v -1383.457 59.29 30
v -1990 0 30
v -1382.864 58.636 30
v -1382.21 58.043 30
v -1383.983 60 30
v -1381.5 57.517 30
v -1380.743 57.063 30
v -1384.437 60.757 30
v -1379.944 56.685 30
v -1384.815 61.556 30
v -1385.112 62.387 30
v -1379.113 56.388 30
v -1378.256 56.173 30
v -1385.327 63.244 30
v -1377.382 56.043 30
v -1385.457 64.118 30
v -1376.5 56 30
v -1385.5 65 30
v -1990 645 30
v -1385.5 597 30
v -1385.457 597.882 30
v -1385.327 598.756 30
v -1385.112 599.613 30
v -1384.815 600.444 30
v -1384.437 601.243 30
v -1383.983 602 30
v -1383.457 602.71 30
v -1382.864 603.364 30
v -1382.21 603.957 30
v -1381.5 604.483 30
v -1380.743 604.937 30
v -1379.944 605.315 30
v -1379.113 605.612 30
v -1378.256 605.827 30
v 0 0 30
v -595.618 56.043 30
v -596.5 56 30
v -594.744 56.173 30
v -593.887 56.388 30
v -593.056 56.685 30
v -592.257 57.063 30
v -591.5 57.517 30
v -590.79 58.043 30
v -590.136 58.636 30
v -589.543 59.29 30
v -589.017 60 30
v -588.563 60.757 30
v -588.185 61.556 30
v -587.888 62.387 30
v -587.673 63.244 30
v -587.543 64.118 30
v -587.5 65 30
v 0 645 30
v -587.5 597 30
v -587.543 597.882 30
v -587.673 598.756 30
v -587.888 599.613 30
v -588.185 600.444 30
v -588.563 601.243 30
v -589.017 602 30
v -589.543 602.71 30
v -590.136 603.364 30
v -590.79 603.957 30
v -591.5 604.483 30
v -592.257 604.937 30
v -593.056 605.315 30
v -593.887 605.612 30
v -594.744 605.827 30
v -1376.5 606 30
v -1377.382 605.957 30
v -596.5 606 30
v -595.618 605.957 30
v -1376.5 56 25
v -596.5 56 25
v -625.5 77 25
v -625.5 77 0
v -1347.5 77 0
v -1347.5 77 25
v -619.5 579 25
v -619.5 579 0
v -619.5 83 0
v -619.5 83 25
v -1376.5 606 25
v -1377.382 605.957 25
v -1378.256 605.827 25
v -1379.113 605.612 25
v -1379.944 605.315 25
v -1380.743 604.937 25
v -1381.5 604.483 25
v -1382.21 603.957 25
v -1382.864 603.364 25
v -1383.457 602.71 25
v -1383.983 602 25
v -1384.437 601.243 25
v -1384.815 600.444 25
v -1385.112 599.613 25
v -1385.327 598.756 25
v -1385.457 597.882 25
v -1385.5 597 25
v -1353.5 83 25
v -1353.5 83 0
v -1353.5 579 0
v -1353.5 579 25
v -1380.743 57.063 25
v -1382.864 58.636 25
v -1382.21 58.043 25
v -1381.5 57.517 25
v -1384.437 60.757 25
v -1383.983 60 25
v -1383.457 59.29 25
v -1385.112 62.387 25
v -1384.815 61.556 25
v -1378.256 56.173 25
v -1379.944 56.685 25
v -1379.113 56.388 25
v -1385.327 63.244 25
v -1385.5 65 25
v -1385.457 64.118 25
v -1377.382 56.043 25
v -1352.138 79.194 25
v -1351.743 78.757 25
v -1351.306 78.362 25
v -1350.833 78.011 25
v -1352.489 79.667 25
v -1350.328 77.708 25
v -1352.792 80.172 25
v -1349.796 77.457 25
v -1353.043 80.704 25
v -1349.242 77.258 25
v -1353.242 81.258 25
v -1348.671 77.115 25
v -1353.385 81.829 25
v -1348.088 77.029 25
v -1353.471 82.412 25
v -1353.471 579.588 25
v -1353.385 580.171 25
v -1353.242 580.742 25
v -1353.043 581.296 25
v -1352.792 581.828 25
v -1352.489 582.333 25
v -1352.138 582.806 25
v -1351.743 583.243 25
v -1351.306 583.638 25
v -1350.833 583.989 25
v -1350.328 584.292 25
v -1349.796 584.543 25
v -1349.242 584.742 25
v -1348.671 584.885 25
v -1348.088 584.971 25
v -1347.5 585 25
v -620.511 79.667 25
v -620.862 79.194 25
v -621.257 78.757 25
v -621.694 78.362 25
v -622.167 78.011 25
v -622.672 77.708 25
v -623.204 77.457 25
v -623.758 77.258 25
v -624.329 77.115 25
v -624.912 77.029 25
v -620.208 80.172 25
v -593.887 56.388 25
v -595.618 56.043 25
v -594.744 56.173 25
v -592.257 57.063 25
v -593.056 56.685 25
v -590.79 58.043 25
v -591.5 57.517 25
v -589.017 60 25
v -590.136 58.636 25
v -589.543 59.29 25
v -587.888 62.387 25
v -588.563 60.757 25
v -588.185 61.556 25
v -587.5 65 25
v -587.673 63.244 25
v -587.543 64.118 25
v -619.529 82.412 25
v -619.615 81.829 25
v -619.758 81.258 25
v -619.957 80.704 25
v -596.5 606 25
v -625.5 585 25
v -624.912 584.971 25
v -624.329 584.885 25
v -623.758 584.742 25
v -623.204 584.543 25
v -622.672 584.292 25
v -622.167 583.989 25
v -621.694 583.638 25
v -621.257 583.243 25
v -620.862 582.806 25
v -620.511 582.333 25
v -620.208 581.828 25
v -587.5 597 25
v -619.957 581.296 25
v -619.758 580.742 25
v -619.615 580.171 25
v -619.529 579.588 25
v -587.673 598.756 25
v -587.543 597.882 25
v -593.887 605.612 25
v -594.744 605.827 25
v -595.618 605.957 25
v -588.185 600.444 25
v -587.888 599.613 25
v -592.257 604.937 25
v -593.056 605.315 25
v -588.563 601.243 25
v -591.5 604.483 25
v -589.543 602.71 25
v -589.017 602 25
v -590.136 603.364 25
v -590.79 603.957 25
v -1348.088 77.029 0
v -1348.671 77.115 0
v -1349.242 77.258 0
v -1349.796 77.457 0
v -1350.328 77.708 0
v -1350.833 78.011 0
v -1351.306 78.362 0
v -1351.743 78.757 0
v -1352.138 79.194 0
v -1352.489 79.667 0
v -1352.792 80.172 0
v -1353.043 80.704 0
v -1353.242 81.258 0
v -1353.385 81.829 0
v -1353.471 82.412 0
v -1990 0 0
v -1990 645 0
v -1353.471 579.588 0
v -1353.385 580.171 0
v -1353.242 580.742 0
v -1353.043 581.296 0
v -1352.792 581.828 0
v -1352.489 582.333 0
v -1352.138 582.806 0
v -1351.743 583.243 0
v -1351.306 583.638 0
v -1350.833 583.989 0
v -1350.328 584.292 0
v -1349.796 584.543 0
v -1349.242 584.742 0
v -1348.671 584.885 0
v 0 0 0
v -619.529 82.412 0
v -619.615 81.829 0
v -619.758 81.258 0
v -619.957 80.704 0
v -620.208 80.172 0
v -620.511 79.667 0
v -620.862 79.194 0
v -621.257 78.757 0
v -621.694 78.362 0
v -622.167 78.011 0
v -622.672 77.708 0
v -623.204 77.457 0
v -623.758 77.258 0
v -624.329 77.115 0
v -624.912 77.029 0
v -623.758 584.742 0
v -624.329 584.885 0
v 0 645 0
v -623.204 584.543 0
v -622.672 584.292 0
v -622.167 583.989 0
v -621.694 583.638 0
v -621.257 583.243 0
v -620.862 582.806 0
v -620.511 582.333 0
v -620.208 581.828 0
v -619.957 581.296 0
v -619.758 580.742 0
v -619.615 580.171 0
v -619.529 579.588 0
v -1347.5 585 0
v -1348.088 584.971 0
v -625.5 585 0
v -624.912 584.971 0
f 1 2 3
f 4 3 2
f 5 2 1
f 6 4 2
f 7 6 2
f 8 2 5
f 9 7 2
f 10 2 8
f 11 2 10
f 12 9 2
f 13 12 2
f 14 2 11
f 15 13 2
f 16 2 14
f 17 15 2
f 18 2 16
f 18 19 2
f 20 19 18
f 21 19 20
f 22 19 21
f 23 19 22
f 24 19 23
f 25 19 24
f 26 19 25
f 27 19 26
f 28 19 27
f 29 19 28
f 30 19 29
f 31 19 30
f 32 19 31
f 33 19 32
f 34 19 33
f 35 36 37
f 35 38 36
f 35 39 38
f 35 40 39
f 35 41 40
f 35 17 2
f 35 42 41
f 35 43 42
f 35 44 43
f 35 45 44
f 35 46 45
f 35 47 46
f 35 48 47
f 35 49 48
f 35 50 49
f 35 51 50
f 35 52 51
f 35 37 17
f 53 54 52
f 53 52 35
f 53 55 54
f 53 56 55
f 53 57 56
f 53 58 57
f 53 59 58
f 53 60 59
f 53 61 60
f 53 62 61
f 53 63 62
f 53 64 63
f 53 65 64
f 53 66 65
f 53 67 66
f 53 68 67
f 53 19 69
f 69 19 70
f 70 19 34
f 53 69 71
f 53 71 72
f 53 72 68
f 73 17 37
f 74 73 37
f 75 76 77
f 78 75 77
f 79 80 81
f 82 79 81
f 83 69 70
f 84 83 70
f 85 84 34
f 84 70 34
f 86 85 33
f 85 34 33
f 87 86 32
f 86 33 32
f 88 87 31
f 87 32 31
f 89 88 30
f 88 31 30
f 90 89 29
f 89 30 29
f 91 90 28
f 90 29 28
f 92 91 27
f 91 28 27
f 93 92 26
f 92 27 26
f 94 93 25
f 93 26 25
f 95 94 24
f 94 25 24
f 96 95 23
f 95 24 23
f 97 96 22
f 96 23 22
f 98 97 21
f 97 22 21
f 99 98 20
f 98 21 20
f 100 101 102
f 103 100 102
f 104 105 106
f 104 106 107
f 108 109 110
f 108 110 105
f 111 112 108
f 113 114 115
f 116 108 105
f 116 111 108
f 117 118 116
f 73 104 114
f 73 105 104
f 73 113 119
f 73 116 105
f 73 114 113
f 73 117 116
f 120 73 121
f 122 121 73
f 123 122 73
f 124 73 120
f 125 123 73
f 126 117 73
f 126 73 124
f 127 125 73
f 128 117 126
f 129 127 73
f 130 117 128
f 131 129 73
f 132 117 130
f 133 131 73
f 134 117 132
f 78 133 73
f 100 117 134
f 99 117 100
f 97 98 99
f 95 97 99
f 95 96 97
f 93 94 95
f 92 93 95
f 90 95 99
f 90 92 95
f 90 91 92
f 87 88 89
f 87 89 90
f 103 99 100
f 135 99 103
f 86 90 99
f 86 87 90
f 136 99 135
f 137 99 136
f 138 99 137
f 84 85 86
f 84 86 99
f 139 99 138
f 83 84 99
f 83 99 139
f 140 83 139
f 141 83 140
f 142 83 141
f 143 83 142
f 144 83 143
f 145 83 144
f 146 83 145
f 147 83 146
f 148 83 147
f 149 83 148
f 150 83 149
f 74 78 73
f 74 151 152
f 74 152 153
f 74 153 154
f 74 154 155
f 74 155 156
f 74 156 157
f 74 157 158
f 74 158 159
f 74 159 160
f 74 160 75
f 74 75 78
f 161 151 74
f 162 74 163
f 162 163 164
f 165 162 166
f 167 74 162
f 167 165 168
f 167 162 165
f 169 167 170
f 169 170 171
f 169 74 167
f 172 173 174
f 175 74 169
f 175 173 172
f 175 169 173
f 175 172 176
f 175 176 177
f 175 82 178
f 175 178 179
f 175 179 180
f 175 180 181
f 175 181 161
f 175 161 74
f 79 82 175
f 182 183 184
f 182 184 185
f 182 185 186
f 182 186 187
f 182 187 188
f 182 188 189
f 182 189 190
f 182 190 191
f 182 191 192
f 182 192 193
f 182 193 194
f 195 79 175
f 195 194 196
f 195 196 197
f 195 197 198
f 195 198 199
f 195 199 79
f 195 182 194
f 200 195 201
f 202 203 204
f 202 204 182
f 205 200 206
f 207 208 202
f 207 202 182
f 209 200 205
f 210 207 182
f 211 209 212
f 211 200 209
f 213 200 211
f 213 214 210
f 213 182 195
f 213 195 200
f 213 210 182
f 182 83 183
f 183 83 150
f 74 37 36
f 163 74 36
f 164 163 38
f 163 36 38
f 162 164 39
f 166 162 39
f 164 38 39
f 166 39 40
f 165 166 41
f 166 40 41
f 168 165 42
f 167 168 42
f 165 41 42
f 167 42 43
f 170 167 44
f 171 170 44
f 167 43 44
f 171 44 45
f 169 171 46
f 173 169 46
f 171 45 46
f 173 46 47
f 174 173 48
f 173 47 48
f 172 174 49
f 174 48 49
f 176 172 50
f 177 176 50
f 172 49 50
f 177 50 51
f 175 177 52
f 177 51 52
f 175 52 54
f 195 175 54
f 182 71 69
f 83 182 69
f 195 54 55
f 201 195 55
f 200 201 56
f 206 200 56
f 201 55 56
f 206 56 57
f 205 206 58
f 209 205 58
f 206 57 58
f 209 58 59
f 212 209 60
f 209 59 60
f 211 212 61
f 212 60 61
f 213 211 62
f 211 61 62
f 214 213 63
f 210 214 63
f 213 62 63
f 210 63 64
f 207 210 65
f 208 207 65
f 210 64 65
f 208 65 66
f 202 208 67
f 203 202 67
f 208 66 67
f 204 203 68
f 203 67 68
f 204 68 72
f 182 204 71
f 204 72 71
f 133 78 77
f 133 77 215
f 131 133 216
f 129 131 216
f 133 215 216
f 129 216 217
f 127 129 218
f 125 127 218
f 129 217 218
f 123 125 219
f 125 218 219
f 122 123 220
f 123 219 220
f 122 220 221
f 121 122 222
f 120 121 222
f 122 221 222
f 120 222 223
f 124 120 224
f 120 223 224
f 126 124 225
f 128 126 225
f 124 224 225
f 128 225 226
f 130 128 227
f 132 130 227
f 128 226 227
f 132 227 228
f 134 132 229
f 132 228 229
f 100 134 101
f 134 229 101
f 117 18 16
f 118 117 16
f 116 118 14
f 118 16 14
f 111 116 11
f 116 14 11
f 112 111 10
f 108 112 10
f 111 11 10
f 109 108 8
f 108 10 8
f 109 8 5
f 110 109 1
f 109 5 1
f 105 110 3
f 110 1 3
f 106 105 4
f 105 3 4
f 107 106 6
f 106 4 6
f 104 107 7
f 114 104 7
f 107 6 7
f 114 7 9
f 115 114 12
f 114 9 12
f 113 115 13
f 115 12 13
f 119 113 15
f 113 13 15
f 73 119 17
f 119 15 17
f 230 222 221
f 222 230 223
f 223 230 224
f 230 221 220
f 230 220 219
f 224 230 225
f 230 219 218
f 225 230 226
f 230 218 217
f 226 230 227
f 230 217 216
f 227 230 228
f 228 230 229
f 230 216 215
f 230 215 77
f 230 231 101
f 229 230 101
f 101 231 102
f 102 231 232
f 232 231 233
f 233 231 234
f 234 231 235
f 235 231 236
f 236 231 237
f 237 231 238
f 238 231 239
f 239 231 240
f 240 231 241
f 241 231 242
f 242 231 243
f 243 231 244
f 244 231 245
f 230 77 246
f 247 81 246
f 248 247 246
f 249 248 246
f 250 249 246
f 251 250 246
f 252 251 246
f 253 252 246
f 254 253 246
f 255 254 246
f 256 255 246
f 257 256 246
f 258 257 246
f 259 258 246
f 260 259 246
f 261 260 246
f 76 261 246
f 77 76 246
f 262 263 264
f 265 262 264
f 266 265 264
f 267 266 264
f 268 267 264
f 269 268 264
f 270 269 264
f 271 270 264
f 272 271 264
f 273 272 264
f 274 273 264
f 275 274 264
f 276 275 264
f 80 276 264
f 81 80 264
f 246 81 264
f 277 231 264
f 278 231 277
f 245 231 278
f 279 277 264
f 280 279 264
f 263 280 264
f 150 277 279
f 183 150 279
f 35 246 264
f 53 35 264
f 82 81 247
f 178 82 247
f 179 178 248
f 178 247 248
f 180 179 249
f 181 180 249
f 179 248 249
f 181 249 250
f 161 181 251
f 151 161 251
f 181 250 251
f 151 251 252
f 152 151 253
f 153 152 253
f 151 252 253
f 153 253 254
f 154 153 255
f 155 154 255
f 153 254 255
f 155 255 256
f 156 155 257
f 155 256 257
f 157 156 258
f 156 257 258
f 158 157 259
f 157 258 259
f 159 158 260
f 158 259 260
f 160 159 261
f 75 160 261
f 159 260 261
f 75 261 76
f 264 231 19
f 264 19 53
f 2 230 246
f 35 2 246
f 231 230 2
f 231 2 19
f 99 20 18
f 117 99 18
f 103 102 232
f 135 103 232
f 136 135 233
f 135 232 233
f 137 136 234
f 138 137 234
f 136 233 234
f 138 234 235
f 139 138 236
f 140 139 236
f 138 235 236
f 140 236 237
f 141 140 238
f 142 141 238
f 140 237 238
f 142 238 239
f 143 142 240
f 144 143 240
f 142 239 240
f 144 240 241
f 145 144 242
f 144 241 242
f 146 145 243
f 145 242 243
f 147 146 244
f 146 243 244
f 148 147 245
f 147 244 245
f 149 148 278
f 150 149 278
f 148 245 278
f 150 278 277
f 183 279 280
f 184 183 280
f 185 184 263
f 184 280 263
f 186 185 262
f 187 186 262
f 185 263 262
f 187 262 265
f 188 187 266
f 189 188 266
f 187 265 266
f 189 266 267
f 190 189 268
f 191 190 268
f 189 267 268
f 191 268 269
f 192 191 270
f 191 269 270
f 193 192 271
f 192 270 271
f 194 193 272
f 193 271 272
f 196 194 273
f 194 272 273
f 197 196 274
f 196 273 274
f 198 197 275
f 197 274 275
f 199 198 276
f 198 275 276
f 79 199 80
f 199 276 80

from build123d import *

# Parameters (mm, degrees)
F0_W     = 1990
F0_H     = 645
F1_DEPTH = 30
F3_DEPTH = 5


with BuildPart() as f1:
    # F0 (on Top) → F1 (new body)
    with BuildSketch(Plane.XY):
        with Locations((-995, 322.5)):
            Rectangle(F0_W, F0_H)
        with BuildLine():
            ThreePointArc((-1353.5, 579), (-1351.742641, 583.242641), (-1347.5, 585))
            Line((-1347.5, 585), (-625.5, 585))
            ThreePointArc((-625.5, 585), (-621.257359, 583.242641), (-619.5, 579))
            Line((-619.5, 579), (-619.5, 83))
            ThreePointArc((-619.5, 83), (-621.257359, 78.757359), (-625.5, 77))
            Line((-625.5, 77), (-1347.5, 77))
            ThreePointArc((-1347.5, 77), (-1351.742641, 78.757359), (-1353.5, 83))
            Line((-1353.5, 83), (-1353.5, 579))
        make_face(mode=Mode.SUBTRACT)
    extrude(amount=F1_DEPTH)

    # F2 (on face) → F3 (cut)
    with BuildSketch(Plane.XY.offset(30)):
        with BuildLine():
            Line((-587.5, 65), (-587.5, 597))
            ThreePointArc((-587.5, 597), (-590.136039, 603.363961), (-596.5, 606))
            Line((-596.5, 606), (-1376.5, 606))
            ThreePointArc((-1376.5, 606), (-1382.863961, 603.363961), (-1385.5, 597))
            Line((-1385.5, 597), (-1385.5, 65))
            ThreePointArc((-1385.5, 65), (-1382.863961, 58.636039), (-1376.5, 56))
            Line((-1376.5, 56), (-596.5, 56))
            ThreePointArc((-596.5, 56), (-590.136039, 58.636039), (-587.5, 65))
        make_face()
        with BuildLine():
            Line((-625.5, 77), (-1347.5, 77))
            ThreePointArc((-1347.5, 77), (-1351.742641, 78.757359), (-1353.5, 83))
            Line((-1353.5, 83), (-1353.5, 579))
            ThreePointArc((-1353.5, 579), (-1351.742641, 583.242641), (-1347.5, 585))
            Line((-1347.5, 585), (-625.5, 585))
            ThreePointArc((-625.5, 585), (-621.257359, 583.242641), (-619.5, 579))
            Line((-619.5, 579), (-619.5, 83))
            ThreePointArc((-619.5, 83), (-621.257359, 78.757359), (-625.5, 77))
        make_face(mode=Mode.SUBTRACT)
    extrude(amount=-F3_DEPTH, mode=Mode.SUBTRACT)


solid = f1.part
